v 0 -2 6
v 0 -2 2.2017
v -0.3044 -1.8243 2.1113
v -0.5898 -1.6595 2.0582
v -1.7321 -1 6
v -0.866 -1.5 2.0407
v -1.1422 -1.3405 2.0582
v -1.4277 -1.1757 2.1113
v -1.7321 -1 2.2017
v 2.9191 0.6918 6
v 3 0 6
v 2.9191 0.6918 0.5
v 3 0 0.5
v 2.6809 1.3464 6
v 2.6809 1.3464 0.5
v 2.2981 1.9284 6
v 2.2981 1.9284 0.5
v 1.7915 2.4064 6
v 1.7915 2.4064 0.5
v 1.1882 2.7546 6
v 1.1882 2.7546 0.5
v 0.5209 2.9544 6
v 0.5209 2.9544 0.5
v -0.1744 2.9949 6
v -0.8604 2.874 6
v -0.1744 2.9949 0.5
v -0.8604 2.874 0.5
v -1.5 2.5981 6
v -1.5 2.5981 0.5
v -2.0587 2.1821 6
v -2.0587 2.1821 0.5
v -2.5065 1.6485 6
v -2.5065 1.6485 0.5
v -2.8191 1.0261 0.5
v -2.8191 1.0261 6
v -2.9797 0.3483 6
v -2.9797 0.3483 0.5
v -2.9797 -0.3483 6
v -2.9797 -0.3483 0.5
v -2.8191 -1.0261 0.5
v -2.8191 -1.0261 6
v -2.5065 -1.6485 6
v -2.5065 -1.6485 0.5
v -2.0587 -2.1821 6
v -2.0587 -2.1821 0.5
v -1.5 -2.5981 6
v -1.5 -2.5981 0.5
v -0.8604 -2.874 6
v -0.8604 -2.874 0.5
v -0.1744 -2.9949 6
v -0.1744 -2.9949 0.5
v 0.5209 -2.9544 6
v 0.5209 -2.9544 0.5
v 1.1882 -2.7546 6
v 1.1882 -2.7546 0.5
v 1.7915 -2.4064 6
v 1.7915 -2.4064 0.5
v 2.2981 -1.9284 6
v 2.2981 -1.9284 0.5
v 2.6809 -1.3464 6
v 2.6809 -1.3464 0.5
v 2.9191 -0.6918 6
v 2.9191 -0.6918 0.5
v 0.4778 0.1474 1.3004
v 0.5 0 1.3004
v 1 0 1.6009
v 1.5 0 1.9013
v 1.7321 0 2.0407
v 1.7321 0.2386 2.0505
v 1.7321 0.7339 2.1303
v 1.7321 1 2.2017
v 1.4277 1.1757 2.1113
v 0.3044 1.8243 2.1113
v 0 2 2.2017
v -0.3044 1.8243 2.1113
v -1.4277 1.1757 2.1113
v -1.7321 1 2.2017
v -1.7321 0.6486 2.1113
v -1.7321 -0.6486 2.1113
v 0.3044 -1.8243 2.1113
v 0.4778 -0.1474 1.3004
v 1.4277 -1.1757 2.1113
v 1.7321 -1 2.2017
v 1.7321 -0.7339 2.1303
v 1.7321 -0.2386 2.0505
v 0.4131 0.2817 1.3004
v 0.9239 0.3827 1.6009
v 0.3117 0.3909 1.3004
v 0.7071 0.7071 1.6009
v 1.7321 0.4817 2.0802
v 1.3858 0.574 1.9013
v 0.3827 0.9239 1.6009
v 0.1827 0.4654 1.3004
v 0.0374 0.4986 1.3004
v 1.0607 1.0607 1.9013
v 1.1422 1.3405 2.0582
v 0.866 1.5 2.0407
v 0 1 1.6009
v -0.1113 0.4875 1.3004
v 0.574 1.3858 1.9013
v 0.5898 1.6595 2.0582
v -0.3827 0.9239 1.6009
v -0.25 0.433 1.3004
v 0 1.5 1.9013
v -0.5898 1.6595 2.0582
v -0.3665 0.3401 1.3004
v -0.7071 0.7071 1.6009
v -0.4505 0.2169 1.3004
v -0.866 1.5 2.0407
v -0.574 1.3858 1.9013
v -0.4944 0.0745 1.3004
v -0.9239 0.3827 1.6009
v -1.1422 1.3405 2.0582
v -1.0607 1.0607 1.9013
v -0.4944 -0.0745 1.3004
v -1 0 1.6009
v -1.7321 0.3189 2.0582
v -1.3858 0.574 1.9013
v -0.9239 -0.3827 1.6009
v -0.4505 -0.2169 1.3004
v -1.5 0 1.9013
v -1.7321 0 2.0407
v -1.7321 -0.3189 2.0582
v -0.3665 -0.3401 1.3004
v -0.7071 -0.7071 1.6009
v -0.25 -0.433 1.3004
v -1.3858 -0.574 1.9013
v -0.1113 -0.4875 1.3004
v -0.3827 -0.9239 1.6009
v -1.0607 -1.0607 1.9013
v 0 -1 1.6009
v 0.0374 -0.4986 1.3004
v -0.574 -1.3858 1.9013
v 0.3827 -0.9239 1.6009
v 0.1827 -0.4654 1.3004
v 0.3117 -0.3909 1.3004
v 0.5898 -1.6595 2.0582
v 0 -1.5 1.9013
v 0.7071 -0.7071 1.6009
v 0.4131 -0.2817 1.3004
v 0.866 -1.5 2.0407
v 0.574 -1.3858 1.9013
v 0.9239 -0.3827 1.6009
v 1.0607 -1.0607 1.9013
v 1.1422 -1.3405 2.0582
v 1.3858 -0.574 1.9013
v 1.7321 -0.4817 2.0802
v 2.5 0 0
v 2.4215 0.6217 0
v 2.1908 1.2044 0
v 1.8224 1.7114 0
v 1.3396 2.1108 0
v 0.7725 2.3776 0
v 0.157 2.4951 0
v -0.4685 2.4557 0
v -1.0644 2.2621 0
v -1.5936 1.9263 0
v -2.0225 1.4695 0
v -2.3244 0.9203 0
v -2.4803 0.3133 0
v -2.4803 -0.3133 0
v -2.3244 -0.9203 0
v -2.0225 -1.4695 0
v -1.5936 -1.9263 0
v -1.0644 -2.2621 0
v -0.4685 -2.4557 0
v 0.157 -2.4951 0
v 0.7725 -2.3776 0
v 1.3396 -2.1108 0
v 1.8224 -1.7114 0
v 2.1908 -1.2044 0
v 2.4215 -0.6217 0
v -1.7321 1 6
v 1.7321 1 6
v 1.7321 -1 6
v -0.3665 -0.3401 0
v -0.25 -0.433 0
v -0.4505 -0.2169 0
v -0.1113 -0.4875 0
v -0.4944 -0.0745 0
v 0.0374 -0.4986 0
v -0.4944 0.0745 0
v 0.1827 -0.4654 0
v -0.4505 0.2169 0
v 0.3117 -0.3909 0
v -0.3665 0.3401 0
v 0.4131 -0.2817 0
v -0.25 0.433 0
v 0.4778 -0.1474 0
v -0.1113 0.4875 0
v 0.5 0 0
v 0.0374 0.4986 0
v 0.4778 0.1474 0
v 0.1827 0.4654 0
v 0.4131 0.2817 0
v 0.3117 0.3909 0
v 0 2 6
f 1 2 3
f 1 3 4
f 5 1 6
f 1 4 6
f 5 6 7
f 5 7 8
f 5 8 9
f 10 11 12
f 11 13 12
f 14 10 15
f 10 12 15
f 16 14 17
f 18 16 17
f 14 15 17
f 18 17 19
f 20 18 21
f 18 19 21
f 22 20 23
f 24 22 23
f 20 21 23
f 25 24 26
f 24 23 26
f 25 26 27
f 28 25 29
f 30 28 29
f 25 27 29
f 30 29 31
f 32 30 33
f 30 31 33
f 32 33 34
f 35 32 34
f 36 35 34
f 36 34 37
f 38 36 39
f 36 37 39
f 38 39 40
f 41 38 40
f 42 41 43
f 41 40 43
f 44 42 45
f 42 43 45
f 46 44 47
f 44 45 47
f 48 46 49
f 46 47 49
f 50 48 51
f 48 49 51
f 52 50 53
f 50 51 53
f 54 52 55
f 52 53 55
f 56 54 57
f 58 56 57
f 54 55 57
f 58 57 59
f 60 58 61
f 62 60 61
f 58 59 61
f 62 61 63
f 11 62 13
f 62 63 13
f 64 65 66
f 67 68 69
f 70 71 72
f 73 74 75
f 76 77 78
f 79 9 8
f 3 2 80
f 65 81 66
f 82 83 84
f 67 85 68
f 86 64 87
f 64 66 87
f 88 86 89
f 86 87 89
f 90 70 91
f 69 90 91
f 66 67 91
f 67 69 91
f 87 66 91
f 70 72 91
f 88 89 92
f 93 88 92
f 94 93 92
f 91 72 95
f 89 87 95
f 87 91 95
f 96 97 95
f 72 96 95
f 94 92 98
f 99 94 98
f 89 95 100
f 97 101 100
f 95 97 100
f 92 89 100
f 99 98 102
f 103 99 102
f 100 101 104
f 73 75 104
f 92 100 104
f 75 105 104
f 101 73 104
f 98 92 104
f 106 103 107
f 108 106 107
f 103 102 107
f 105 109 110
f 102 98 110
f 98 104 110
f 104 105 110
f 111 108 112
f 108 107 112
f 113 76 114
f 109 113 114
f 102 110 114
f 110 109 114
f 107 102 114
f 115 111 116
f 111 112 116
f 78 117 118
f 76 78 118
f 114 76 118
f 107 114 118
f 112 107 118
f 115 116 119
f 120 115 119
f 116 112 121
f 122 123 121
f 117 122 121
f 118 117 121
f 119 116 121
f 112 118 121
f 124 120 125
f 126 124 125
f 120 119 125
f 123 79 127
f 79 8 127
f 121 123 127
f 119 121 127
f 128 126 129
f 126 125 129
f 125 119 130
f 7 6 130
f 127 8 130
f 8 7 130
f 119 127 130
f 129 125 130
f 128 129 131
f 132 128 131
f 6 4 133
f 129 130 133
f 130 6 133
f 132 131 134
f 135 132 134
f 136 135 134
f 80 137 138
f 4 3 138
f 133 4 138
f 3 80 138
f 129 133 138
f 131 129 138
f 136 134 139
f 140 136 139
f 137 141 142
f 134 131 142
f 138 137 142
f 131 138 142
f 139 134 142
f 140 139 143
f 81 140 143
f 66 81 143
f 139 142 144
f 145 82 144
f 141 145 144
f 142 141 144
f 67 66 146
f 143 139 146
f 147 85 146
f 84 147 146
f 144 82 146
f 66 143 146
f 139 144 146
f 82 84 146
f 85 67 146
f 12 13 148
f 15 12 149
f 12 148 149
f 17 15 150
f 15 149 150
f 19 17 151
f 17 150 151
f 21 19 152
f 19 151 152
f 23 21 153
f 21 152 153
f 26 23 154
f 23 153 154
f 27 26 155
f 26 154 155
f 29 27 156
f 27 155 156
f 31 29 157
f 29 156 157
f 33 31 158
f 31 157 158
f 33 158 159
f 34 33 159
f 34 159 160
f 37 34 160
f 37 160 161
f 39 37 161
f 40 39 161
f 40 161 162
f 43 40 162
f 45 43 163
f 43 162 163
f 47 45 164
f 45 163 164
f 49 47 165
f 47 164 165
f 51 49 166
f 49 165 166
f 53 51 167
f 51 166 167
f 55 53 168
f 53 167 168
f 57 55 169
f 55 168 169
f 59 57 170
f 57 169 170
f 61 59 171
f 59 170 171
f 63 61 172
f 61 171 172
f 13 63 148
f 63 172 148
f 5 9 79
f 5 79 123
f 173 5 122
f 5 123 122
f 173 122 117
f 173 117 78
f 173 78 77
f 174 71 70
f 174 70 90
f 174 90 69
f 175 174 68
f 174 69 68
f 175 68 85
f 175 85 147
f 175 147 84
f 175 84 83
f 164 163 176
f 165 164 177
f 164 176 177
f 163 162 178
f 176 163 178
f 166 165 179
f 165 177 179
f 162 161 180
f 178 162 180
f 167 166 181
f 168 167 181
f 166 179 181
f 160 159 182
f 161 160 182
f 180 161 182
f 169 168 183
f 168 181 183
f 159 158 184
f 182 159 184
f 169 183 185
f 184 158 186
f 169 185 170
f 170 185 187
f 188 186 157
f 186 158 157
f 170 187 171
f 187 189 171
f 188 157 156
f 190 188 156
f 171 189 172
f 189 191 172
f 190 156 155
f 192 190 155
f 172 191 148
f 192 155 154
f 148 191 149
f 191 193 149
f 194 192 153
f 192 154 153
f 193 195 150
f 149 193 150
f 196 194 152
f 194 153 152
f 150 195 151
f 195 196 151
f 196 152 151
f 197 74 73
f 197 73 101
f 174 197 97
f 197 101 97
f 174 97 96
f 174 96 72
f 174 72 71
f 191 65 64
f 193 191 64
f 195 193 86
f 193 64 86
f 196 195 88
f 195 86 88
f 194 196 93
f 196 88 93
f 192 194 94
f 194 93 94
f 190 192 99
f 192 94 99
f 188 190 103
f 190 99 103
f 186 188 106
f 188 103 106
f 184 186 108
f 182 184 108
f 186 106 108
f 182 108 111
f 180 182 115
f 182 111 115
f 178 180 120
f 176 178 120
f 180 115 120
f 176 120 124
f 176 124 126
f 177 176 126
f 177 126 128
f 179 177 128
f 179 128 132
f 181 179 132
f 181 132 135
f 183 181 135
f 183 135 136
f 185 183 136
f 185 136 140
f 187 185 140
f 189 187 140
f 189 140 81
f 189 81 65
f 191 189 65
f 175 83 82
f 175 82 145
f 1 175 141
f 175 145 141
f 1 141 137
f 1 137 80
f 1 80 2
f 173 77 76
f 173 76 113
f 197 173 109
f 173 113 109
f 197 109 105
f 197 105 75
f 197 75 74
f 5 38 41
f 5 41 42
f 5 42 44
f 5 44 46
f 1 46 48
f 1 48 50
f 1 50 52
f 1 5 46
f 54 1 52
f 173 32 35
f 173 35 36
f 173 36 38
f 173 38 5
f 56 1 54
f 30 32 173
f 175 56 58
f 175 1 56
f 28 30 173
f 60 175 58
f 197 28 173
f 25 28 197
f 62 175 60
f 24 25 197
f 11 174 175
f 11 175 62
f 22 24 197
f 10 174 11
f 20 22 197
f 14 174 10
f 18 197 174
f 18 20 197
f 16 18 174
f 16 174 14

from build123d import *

# Parameters (mm, degrees)
ESQUISSE1_R                       = 3
BOSS_EXTRU_1_DEPTH                = 6
CHANFREIN1_SIZE                   = 0.5
DIAM_TRE_DU_PER_AGE_4_0_4_1_D     = 4
DIAM_TRE_DU_PER_AGE_4_0_4_1_DEPTH = 3.798278762
DIAM_TRE_DU_PER_AGE_4_0_4_1_TIP   = 1.201721238
BOSS_EXTRU_3_START                = -5
ESQUISSE2_R                       = 3
BOSS_EXTRU_3_DEPTH                = 5
DIAM_TRE_DU_PER_AGE_1_0_1_1_D     = 1
DIAM_TRE_DU_PER_AGE_1_0_1_1_DEPTH = 1.5
DIAM_TRE_DU_PER_AGE_1_0_1_1_TIP   = 0.30043031


with BuildPart() as part:
    # Esquisse1 → Boss.-Extru.1 (new body)
    with BuildSketch(Plane.XY):
        Circle(ESQUISSE1_R)
    extrude(amount=BOSS_EXTRU_1_DEPTH)

    # Chanfrein1
    chanfrein1_edges = [part.edges().sort_by_distance(p)[0] for p in [
        (-3, 0, 0),
    ]]
    chamfer(chanfrein1_edges, length=CHANFREIN1_SIZE)

    # Diamètre du perçage Ø4.0 (4)1
    with Locations(Plane.XY.offset(6)):
        with Locations((0, 0)):
            Hole(DIAM_TRE_DU_PER_AGE_4_0_4_1_D / 2, depth=DIAM_TRE_DU_PER_AGE_4_0_4_1_DEPTH)
            with Locations((0, 0, -(DIAM_TRE_DU_PER_AGE_4_0_4_1_DEPTH + DIAM_TRE_DU_PER_AGE_4_0_4_1_TIP / 2))):  # 118° drill point
                Cone(0, DIAM_TRE_DU_PER_AGE_4_0_4_1_D / 2, DIAM_TRE_DU_PER_AGE_4_0_4_1_TIP, mode=Mode.SUBTRACT)

    # Esquisse2 → Boss.-Extru.3 (add)
    with BuildSketch(Plane.XY.offset(6).offset(BOSS_EXTRU_3_START)):
        Circle(ESQUISSE2_R)
        Polygon((0, 2), (1.732050808, 1), (1.732050808, -1), (0, -2), (-1.732050808, -1), (-1.732050808, 1), align=None, mode=Mode.SUBTRACT)
    extrude(amount=BOSS_EXTRU_3_DEPTH)

    # Diamètre du perçage Ø1.0 (1)1
    with Locations(Plane(origin=(0, 0, 0), x_dir=(-1, 0, 0), z_dir=(0, 0, -1))):
        with Locations((0, 0)):
            Hole(DIAM_TRE_DU_PER_AGE_1_0_1_1_D / 2, depth=DIAM_TRE_DU_PER_AGE_1_0_1_1_DEPTH)
            with Locations((0, 0, -(DIAM_TRE_DU_PER_AGE_1_0_1_1_DEPTH + DIAM_TRE_DU_PER_AGE_1_0_1_1_TIP / 2))):  # 118° drill point
                Cone(0, DIAM_TRE_DU_PER_AGE_1_0_1_1_D / 2, DIAM_TRE_DU_PER_AGE_1_0_1_1_TIP, mode=Mode.SUBTRACT)


solid = part.part
